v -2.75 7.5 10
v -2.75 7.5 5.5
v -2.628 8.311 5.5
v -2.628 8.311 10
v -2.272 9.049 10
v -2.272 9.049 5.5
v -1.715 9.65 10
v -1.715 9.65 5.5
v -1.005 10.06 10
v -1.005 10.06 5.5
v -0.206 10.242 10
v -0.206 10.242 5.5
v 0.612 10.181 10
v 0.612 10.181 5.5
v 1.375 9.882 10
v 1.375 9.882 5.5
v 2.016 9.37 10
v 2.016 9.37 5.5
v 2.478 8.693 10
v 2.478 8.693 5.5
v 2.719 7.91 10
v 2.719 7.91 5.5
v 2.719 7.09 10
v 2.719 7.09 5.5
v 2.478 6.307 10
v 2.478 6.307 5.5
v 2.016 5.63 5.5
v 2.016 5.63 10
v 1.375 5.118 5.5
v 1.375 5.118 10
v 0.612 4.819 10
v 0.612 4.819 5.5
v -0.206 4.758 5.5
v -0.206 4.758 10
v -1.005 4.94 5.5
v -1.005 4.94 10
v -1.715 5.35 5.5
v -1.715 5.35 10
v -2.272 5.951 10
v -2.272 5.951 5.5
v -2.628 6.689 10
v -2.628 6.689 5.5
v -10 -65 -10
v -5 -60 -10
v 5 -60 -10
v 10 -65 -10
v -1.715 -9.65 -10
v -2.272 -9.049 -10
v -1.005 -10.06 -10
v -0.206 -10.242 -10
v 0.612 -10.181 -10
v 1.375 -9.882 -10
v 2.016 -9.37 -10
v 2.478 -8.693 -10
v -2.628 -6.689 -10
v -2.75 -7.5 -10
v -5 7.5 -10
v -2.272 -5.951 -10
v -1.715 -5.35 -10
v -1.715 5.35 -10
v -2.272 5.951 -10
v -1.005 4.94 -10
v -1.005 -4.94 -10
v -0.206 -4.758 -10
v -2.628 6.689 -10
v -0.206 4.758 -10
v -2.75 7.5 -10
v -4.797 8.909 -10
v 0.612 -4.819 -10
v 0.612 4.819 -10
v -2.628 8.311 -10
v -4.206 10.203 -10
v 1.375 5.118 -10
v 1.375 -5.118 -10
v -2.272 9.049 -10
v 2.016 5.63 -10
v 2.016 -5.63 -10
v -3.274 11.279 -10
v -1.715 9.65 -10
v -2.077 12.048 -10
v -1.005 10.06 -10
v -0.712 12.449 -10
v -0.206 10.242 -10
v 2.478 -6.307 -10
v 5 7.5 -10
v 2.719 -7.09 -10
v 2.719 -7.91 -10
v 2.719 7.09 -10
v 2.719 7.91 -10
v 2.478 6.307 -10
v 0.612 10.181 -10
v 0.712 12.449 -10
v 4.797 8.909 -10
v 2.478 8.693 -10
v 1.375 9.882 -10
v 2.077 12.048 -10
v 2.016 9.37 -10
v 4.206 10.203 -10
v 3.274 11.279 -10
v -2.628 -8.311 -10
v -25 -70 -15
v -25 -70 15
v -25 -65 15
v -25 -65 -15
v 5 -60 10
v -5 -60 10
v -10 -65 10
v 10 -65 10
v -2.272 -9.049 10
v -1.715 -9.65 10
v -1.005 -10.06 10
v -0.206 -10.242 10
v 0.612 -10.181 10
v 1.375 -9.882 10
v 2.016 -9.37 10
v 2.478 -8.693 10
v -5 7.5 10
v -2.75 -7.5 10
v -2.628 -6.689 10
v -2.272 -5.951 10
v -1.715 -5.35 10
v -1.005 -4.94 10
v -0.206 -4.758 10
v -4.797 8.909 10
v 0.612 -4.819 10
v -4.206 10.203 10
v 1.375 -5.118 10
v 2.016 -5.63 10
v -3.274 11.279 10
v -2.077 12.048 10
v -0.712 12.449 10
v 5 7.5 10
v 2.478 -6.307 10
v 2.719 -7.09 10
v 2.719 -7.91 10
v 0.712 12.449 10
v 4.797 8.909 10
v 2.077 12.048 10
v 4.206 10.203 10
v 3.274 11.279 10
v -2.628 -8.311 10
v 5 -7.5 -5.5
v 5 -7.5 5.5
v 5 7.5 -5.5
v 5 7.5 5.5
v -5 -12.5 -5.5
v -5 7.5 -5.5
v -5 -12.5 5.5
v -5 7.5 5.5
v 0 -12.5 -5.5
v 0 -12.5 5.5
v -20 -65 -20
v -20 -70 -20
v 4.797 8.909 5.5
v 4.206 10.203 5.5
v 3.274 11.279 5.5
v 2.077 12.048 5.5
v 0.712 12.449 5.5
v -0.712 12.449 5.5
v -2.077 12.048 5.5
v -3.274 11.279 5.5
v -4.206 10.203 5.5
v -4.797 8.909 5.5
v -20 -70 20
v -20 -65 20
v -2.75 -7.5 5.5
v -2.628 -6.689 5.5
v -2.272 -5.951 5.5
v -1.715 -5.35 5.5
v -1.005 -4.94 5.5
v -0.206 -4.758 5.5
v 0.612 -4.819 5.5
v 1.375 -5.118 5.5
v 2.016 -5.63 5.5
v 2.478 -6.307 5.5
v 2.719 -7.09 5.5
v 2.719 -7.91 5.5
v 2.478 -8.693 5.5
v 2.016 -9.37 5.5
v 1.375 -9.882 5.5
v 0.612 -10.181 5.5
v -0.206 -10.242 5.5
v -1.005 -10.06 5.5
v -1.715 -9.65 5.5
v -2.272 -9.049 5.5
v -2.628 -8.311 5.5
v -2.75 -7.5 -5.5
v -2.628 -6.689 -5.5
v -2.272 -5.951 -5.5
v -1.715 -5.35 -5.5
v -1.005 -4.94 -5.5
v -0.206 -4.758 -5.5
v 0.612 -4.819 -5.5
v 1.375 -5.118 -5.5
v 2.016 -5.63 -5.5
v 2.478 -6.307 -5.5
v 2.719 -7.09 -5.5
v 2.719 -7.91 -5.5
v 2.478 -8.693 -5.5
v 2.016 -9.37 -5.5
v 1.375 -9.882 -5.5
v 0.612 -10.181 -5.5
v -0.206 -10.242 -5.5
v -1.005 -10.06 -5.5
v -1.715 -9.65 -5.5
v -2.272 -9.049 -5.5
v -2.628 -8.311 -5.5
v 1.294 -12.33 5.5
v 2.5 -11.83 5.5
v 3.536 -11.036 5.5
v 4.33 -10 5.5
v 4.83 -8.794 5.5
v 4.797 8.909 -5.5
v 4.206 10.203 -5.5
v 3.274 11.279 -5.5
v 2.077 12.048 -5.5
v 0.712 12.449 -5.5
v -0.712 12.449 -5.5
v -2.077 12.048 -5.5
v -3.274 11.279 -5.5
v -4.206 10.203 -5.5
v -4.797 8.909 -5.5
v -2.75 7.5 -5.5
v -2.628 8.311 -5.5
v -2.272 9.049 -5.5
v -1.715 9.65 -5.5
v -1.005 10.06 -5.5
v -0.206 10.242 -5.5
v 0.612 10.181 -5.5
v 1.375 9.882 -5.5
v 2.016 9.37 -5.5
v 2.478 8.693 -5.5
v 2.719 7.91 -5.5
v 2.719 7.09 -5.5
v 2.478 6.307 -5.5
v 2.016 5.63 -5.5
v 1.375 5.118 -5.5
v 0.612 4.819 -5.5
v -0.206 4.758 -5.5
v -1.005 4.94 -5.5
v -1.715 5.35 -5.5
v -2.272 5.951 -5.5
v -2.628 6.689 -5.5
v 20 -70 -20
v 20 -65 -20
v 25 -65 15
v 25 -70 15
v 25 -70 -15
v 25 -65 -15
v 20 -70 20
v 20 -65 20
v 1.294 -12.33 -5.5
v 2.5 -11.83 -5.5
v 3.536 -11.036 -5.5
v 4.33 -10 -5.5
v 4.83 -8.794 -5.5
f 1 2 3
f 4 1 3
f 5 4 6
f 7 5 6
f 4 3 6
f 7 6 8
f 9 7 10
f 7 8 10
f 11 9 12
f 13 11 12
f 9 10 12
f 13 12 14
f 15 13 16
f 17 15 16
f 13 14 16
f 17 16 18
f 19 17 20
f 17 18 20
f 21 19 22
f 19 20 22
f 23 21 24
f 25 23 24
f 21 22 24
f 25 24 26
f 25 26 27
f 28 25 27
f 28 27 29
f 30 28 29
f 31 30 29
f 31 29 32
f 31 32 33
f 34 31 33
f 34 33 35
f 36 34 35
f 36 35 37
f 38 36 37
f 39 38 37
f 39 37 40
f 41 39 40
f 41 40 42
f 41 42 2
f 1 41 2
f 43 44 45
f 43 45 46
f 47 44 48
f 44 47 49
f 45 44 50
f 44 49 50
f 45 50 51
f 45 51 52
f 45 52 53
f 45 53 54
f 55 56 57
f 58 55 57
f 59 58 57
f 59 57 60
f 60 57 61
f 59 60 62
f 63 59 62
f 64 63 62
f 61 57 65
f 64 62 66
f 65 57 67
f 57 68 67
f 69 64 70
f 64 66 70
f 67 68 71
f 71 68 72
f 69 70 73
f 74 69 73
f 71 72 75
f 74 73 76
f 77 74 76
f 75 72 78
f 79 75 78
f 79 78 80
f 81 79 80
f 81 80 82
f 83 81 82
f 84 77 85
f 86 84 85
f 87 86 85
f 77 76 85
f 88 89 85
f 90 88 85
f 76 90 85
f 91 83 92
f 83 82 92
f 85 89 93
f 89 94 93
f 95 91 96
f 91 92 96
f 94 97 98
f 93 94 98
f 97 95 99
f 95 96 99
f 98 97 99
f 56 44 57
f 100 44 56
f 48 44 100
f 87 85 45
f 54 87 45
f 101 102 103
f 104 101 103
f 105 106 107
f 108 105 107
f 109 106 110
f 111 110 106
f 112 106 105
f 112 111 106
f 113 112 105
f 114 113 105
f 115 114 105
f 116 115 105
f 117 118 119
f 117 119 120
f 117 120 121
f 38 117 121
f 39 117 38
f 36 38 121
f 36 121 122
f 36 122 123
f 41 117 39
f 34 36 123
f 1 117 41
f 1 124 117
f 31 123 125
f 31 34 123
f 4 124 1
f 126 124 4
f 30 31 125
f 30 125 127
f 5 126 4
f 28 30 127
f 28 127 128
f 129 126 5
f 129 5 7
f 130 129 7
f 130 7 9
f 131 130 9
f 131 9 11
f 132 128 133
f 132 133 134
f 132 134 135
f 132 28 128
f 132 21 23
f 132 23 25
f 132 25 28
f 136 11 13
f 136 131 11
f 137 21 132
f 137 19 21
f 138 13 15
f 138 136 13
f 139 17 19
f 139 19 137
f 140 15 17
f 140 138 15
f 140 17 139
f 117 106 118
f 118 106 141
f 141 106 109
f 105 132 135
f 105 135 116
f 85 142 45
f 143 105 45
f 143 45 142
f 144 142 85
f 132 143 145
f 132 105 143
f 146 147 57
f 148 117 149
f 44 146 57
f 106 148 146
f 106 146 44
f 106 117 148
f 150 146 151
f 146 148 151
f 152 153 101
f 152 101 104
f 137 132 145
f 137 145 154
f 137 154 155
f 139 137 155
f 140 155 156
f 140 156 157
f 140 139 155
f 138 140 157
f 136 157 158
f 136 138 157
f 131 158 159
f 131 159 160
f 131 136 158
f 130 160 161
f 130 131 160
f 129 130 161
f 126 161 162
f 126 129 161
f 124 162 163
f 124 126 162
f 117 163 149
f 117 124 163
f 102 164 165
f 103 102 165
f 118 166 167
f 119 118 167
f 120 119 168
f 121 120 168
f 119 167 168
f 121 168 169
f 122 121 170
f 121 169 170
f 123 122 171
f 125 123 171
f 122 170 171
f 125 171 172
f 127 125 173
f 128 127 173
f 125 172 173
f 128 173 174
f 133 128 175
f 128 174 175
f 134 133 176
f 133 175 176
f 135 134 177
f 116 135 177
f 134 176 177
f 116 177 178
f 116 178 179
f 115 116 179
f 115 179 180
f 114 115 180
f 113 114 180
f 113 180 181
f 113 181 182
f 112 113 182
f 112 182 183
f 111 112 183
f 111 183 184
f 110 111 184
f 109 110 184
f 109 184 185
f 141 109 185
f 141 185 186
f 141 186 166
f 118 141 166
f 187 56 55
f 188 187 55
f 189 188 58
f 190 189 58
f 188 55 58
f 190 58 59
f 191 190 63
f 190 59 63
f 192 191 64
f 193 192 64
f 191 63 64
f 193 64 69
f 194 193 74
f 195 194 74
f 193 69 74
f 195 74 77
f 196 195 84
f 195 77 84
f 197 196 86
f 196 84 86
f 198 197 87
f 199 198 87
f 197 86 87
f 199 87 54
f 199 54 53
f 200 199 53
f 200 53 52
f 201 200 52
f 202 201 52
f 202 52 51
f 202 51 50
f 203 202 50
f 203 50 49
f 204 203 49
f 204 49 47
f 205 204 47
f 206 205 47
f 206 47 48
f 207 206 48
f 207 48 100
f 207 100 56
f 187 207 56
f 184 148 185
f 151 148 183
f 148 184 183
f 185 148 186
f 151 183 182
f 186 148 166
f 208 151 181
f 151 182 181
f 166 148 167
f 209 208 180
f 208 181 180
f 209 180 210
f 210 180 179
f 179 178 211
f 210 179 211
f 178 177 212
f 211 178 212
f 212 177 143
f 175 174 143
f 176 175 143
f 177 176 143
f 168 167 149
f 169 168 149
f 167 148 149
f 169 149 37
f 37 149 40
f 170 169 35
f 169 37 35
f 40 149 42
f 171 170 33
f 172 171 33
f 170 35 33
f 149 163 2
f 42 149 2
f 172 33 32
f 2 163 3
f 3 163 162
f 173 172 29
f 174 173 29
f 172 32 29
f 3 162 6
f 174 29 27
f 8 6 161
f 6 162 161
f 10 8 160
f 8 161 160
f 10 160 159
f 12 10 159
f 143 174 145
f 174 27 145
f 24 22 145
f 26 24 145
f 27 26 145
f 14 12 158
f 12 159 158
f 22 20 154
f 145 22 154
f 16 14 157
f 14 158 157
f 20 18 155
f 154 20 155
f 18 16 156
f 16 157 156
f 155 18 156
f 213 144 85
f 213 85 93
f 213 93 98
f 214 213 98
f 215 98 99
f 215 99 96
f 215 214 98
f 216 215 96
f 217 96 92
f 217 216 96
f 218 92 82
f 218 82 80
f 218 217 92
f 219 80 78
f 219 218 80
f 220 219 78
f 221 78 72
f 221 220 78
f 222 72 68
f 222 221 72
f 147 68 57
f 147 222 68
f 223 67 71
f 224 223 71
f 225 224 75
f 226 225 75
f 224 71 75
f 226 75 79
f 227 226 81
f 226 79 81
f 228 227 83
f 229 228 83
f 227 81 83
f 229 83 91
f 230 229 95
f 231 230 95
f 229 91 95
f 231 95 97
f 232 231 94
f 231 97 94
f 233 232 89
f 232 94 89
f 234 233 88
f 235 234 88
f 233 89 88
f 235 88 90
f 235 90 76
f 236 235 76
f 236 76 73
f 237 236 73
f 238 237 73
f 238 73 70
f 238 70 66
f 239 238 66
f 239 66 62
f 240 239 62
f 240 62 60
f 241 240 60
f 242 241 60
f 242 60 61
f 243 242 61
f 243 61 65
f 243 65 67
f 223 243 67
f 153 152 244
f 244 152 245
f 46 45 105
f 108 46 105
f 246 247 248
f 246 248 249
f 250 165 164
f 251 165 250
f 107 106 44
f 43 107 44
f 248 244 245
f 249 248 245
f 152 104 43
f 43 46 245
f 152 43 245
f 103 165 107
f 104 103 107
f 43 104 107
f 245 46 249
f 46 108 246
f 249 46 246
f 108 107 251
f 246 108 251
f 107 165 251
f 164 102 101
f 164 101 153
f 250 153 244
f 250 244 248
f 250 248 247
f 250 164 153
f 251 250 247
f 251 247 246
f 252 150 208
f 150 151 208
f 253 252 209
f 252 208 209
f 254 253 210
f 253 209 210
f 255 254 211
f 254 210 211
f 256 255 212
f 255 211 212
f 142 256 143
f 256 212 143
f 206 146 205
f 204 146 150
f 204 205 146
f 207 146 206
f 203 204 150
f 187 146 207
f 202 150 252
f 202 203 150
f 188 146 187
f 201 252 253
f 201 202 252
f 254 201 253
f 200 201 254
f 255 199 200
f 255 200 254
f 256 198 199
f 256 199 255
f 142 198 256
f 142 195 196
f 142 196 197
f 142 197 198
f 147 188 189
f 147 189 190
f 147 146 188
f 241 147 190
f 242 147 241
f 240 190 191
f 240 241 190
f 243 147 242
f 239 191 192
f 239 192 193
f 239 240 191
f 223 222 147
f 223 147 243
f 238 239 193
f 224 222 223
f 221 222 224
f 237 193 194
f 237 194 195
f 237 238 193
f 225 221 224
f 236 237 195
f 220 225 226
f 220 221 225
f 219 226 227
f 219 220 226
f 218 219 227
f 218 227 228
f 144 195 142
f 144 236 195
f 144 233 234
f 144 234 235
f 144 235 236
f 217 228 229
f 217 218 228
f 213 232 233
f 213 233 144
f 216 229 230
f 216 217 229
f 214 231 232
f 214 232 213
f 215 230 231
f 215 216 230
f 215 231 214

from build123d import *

# Parameters (mm, degrees)
BOSS_EXTRUDE1_DEPTH  = 10
M5_CLEARANCE_HOLE1_D = 5.5
CUT_EXTRUDE1_DEPTH   = 5.5
BOSS_EXTRUDE2_DEPTH  = 20
CHAMFER1_SIZE        = 5


with BuildPart() as part:
    # Sketch1 → Boss-Extrude1 (new, symmetric)
    with BuildSketch(Plane.XY):
        with BuildLine():
            Line((-5, -65), (-25, -65))
            Line((-25, -65), (-25, -70))
            Line((-25, -70), (25, -70))
            Line((25, -70), (25, -65))
            Line((25, -65), (5, -65))
            Line((5, -65), (5, 7.5))
            ThreePointArc((5, 7.5), (0, 12.5), (-5, 7.5))
            Line((-5, 7.5), (-5, -65))
        make_face()
    extrude(amount=BOSS_EXTRUDE1_DEPTH, both=True)

    # M5 Clearance Hole1 (through all)
    with Locations(Plane.XY.offset(10)):
        with Locations((0, 7.5), (0, -7.5)):
            Hole(M5_CLEARANCE_HOLE1_D / 2)

    # Sketch1<3> → Cut-Extrude1 (cut, symmetric)
    with BuildSketch(Plane.XY):
        with BuildLine():
            ThreePointArc((0, -12.5), (3.535533906, -11.035533906), (5, -7.5))
            Line((5, -7.5), (5, 7.5))
            ThreePointArc((5, 7.5), (0, 12.5), (-5, 7.5))
            Line((-5, 7.5), (-5, -12.5))
            Line((-5, -12.5), (0, -12.5))
        make_face()
    extrude(amount=CUT_EXTRUDE1_DEPTH, both=True, mode=Mode.SUBTRACT)

    # Sketch1<4> → Boss-Extrude2 (add, symmetric)
    with BuildSketch(Plane.XY):
        Polygon((25, -65), (5, -65), (-5, -65), (-25, -65), (-25, -70), (25, -70), align=None)
    extrude(amount=BOSS_EXTRUDE2_DEPTH, both=True)

    # Chamfer1
    chamfer1_edges = [part.edges().sort_by_distance(p)[0] for p in [
        (5, -65, 0),
        (-5, -65, 0),
        (25, -67.5, -20),
        (-25, -67.5, -20),
        (25, -67.5, 20),
        (-25, -67.5, 20),
    ]]
    chamfer(chamfer1_edges, length=CHAMFER1_SIZE)


solid = part.part
